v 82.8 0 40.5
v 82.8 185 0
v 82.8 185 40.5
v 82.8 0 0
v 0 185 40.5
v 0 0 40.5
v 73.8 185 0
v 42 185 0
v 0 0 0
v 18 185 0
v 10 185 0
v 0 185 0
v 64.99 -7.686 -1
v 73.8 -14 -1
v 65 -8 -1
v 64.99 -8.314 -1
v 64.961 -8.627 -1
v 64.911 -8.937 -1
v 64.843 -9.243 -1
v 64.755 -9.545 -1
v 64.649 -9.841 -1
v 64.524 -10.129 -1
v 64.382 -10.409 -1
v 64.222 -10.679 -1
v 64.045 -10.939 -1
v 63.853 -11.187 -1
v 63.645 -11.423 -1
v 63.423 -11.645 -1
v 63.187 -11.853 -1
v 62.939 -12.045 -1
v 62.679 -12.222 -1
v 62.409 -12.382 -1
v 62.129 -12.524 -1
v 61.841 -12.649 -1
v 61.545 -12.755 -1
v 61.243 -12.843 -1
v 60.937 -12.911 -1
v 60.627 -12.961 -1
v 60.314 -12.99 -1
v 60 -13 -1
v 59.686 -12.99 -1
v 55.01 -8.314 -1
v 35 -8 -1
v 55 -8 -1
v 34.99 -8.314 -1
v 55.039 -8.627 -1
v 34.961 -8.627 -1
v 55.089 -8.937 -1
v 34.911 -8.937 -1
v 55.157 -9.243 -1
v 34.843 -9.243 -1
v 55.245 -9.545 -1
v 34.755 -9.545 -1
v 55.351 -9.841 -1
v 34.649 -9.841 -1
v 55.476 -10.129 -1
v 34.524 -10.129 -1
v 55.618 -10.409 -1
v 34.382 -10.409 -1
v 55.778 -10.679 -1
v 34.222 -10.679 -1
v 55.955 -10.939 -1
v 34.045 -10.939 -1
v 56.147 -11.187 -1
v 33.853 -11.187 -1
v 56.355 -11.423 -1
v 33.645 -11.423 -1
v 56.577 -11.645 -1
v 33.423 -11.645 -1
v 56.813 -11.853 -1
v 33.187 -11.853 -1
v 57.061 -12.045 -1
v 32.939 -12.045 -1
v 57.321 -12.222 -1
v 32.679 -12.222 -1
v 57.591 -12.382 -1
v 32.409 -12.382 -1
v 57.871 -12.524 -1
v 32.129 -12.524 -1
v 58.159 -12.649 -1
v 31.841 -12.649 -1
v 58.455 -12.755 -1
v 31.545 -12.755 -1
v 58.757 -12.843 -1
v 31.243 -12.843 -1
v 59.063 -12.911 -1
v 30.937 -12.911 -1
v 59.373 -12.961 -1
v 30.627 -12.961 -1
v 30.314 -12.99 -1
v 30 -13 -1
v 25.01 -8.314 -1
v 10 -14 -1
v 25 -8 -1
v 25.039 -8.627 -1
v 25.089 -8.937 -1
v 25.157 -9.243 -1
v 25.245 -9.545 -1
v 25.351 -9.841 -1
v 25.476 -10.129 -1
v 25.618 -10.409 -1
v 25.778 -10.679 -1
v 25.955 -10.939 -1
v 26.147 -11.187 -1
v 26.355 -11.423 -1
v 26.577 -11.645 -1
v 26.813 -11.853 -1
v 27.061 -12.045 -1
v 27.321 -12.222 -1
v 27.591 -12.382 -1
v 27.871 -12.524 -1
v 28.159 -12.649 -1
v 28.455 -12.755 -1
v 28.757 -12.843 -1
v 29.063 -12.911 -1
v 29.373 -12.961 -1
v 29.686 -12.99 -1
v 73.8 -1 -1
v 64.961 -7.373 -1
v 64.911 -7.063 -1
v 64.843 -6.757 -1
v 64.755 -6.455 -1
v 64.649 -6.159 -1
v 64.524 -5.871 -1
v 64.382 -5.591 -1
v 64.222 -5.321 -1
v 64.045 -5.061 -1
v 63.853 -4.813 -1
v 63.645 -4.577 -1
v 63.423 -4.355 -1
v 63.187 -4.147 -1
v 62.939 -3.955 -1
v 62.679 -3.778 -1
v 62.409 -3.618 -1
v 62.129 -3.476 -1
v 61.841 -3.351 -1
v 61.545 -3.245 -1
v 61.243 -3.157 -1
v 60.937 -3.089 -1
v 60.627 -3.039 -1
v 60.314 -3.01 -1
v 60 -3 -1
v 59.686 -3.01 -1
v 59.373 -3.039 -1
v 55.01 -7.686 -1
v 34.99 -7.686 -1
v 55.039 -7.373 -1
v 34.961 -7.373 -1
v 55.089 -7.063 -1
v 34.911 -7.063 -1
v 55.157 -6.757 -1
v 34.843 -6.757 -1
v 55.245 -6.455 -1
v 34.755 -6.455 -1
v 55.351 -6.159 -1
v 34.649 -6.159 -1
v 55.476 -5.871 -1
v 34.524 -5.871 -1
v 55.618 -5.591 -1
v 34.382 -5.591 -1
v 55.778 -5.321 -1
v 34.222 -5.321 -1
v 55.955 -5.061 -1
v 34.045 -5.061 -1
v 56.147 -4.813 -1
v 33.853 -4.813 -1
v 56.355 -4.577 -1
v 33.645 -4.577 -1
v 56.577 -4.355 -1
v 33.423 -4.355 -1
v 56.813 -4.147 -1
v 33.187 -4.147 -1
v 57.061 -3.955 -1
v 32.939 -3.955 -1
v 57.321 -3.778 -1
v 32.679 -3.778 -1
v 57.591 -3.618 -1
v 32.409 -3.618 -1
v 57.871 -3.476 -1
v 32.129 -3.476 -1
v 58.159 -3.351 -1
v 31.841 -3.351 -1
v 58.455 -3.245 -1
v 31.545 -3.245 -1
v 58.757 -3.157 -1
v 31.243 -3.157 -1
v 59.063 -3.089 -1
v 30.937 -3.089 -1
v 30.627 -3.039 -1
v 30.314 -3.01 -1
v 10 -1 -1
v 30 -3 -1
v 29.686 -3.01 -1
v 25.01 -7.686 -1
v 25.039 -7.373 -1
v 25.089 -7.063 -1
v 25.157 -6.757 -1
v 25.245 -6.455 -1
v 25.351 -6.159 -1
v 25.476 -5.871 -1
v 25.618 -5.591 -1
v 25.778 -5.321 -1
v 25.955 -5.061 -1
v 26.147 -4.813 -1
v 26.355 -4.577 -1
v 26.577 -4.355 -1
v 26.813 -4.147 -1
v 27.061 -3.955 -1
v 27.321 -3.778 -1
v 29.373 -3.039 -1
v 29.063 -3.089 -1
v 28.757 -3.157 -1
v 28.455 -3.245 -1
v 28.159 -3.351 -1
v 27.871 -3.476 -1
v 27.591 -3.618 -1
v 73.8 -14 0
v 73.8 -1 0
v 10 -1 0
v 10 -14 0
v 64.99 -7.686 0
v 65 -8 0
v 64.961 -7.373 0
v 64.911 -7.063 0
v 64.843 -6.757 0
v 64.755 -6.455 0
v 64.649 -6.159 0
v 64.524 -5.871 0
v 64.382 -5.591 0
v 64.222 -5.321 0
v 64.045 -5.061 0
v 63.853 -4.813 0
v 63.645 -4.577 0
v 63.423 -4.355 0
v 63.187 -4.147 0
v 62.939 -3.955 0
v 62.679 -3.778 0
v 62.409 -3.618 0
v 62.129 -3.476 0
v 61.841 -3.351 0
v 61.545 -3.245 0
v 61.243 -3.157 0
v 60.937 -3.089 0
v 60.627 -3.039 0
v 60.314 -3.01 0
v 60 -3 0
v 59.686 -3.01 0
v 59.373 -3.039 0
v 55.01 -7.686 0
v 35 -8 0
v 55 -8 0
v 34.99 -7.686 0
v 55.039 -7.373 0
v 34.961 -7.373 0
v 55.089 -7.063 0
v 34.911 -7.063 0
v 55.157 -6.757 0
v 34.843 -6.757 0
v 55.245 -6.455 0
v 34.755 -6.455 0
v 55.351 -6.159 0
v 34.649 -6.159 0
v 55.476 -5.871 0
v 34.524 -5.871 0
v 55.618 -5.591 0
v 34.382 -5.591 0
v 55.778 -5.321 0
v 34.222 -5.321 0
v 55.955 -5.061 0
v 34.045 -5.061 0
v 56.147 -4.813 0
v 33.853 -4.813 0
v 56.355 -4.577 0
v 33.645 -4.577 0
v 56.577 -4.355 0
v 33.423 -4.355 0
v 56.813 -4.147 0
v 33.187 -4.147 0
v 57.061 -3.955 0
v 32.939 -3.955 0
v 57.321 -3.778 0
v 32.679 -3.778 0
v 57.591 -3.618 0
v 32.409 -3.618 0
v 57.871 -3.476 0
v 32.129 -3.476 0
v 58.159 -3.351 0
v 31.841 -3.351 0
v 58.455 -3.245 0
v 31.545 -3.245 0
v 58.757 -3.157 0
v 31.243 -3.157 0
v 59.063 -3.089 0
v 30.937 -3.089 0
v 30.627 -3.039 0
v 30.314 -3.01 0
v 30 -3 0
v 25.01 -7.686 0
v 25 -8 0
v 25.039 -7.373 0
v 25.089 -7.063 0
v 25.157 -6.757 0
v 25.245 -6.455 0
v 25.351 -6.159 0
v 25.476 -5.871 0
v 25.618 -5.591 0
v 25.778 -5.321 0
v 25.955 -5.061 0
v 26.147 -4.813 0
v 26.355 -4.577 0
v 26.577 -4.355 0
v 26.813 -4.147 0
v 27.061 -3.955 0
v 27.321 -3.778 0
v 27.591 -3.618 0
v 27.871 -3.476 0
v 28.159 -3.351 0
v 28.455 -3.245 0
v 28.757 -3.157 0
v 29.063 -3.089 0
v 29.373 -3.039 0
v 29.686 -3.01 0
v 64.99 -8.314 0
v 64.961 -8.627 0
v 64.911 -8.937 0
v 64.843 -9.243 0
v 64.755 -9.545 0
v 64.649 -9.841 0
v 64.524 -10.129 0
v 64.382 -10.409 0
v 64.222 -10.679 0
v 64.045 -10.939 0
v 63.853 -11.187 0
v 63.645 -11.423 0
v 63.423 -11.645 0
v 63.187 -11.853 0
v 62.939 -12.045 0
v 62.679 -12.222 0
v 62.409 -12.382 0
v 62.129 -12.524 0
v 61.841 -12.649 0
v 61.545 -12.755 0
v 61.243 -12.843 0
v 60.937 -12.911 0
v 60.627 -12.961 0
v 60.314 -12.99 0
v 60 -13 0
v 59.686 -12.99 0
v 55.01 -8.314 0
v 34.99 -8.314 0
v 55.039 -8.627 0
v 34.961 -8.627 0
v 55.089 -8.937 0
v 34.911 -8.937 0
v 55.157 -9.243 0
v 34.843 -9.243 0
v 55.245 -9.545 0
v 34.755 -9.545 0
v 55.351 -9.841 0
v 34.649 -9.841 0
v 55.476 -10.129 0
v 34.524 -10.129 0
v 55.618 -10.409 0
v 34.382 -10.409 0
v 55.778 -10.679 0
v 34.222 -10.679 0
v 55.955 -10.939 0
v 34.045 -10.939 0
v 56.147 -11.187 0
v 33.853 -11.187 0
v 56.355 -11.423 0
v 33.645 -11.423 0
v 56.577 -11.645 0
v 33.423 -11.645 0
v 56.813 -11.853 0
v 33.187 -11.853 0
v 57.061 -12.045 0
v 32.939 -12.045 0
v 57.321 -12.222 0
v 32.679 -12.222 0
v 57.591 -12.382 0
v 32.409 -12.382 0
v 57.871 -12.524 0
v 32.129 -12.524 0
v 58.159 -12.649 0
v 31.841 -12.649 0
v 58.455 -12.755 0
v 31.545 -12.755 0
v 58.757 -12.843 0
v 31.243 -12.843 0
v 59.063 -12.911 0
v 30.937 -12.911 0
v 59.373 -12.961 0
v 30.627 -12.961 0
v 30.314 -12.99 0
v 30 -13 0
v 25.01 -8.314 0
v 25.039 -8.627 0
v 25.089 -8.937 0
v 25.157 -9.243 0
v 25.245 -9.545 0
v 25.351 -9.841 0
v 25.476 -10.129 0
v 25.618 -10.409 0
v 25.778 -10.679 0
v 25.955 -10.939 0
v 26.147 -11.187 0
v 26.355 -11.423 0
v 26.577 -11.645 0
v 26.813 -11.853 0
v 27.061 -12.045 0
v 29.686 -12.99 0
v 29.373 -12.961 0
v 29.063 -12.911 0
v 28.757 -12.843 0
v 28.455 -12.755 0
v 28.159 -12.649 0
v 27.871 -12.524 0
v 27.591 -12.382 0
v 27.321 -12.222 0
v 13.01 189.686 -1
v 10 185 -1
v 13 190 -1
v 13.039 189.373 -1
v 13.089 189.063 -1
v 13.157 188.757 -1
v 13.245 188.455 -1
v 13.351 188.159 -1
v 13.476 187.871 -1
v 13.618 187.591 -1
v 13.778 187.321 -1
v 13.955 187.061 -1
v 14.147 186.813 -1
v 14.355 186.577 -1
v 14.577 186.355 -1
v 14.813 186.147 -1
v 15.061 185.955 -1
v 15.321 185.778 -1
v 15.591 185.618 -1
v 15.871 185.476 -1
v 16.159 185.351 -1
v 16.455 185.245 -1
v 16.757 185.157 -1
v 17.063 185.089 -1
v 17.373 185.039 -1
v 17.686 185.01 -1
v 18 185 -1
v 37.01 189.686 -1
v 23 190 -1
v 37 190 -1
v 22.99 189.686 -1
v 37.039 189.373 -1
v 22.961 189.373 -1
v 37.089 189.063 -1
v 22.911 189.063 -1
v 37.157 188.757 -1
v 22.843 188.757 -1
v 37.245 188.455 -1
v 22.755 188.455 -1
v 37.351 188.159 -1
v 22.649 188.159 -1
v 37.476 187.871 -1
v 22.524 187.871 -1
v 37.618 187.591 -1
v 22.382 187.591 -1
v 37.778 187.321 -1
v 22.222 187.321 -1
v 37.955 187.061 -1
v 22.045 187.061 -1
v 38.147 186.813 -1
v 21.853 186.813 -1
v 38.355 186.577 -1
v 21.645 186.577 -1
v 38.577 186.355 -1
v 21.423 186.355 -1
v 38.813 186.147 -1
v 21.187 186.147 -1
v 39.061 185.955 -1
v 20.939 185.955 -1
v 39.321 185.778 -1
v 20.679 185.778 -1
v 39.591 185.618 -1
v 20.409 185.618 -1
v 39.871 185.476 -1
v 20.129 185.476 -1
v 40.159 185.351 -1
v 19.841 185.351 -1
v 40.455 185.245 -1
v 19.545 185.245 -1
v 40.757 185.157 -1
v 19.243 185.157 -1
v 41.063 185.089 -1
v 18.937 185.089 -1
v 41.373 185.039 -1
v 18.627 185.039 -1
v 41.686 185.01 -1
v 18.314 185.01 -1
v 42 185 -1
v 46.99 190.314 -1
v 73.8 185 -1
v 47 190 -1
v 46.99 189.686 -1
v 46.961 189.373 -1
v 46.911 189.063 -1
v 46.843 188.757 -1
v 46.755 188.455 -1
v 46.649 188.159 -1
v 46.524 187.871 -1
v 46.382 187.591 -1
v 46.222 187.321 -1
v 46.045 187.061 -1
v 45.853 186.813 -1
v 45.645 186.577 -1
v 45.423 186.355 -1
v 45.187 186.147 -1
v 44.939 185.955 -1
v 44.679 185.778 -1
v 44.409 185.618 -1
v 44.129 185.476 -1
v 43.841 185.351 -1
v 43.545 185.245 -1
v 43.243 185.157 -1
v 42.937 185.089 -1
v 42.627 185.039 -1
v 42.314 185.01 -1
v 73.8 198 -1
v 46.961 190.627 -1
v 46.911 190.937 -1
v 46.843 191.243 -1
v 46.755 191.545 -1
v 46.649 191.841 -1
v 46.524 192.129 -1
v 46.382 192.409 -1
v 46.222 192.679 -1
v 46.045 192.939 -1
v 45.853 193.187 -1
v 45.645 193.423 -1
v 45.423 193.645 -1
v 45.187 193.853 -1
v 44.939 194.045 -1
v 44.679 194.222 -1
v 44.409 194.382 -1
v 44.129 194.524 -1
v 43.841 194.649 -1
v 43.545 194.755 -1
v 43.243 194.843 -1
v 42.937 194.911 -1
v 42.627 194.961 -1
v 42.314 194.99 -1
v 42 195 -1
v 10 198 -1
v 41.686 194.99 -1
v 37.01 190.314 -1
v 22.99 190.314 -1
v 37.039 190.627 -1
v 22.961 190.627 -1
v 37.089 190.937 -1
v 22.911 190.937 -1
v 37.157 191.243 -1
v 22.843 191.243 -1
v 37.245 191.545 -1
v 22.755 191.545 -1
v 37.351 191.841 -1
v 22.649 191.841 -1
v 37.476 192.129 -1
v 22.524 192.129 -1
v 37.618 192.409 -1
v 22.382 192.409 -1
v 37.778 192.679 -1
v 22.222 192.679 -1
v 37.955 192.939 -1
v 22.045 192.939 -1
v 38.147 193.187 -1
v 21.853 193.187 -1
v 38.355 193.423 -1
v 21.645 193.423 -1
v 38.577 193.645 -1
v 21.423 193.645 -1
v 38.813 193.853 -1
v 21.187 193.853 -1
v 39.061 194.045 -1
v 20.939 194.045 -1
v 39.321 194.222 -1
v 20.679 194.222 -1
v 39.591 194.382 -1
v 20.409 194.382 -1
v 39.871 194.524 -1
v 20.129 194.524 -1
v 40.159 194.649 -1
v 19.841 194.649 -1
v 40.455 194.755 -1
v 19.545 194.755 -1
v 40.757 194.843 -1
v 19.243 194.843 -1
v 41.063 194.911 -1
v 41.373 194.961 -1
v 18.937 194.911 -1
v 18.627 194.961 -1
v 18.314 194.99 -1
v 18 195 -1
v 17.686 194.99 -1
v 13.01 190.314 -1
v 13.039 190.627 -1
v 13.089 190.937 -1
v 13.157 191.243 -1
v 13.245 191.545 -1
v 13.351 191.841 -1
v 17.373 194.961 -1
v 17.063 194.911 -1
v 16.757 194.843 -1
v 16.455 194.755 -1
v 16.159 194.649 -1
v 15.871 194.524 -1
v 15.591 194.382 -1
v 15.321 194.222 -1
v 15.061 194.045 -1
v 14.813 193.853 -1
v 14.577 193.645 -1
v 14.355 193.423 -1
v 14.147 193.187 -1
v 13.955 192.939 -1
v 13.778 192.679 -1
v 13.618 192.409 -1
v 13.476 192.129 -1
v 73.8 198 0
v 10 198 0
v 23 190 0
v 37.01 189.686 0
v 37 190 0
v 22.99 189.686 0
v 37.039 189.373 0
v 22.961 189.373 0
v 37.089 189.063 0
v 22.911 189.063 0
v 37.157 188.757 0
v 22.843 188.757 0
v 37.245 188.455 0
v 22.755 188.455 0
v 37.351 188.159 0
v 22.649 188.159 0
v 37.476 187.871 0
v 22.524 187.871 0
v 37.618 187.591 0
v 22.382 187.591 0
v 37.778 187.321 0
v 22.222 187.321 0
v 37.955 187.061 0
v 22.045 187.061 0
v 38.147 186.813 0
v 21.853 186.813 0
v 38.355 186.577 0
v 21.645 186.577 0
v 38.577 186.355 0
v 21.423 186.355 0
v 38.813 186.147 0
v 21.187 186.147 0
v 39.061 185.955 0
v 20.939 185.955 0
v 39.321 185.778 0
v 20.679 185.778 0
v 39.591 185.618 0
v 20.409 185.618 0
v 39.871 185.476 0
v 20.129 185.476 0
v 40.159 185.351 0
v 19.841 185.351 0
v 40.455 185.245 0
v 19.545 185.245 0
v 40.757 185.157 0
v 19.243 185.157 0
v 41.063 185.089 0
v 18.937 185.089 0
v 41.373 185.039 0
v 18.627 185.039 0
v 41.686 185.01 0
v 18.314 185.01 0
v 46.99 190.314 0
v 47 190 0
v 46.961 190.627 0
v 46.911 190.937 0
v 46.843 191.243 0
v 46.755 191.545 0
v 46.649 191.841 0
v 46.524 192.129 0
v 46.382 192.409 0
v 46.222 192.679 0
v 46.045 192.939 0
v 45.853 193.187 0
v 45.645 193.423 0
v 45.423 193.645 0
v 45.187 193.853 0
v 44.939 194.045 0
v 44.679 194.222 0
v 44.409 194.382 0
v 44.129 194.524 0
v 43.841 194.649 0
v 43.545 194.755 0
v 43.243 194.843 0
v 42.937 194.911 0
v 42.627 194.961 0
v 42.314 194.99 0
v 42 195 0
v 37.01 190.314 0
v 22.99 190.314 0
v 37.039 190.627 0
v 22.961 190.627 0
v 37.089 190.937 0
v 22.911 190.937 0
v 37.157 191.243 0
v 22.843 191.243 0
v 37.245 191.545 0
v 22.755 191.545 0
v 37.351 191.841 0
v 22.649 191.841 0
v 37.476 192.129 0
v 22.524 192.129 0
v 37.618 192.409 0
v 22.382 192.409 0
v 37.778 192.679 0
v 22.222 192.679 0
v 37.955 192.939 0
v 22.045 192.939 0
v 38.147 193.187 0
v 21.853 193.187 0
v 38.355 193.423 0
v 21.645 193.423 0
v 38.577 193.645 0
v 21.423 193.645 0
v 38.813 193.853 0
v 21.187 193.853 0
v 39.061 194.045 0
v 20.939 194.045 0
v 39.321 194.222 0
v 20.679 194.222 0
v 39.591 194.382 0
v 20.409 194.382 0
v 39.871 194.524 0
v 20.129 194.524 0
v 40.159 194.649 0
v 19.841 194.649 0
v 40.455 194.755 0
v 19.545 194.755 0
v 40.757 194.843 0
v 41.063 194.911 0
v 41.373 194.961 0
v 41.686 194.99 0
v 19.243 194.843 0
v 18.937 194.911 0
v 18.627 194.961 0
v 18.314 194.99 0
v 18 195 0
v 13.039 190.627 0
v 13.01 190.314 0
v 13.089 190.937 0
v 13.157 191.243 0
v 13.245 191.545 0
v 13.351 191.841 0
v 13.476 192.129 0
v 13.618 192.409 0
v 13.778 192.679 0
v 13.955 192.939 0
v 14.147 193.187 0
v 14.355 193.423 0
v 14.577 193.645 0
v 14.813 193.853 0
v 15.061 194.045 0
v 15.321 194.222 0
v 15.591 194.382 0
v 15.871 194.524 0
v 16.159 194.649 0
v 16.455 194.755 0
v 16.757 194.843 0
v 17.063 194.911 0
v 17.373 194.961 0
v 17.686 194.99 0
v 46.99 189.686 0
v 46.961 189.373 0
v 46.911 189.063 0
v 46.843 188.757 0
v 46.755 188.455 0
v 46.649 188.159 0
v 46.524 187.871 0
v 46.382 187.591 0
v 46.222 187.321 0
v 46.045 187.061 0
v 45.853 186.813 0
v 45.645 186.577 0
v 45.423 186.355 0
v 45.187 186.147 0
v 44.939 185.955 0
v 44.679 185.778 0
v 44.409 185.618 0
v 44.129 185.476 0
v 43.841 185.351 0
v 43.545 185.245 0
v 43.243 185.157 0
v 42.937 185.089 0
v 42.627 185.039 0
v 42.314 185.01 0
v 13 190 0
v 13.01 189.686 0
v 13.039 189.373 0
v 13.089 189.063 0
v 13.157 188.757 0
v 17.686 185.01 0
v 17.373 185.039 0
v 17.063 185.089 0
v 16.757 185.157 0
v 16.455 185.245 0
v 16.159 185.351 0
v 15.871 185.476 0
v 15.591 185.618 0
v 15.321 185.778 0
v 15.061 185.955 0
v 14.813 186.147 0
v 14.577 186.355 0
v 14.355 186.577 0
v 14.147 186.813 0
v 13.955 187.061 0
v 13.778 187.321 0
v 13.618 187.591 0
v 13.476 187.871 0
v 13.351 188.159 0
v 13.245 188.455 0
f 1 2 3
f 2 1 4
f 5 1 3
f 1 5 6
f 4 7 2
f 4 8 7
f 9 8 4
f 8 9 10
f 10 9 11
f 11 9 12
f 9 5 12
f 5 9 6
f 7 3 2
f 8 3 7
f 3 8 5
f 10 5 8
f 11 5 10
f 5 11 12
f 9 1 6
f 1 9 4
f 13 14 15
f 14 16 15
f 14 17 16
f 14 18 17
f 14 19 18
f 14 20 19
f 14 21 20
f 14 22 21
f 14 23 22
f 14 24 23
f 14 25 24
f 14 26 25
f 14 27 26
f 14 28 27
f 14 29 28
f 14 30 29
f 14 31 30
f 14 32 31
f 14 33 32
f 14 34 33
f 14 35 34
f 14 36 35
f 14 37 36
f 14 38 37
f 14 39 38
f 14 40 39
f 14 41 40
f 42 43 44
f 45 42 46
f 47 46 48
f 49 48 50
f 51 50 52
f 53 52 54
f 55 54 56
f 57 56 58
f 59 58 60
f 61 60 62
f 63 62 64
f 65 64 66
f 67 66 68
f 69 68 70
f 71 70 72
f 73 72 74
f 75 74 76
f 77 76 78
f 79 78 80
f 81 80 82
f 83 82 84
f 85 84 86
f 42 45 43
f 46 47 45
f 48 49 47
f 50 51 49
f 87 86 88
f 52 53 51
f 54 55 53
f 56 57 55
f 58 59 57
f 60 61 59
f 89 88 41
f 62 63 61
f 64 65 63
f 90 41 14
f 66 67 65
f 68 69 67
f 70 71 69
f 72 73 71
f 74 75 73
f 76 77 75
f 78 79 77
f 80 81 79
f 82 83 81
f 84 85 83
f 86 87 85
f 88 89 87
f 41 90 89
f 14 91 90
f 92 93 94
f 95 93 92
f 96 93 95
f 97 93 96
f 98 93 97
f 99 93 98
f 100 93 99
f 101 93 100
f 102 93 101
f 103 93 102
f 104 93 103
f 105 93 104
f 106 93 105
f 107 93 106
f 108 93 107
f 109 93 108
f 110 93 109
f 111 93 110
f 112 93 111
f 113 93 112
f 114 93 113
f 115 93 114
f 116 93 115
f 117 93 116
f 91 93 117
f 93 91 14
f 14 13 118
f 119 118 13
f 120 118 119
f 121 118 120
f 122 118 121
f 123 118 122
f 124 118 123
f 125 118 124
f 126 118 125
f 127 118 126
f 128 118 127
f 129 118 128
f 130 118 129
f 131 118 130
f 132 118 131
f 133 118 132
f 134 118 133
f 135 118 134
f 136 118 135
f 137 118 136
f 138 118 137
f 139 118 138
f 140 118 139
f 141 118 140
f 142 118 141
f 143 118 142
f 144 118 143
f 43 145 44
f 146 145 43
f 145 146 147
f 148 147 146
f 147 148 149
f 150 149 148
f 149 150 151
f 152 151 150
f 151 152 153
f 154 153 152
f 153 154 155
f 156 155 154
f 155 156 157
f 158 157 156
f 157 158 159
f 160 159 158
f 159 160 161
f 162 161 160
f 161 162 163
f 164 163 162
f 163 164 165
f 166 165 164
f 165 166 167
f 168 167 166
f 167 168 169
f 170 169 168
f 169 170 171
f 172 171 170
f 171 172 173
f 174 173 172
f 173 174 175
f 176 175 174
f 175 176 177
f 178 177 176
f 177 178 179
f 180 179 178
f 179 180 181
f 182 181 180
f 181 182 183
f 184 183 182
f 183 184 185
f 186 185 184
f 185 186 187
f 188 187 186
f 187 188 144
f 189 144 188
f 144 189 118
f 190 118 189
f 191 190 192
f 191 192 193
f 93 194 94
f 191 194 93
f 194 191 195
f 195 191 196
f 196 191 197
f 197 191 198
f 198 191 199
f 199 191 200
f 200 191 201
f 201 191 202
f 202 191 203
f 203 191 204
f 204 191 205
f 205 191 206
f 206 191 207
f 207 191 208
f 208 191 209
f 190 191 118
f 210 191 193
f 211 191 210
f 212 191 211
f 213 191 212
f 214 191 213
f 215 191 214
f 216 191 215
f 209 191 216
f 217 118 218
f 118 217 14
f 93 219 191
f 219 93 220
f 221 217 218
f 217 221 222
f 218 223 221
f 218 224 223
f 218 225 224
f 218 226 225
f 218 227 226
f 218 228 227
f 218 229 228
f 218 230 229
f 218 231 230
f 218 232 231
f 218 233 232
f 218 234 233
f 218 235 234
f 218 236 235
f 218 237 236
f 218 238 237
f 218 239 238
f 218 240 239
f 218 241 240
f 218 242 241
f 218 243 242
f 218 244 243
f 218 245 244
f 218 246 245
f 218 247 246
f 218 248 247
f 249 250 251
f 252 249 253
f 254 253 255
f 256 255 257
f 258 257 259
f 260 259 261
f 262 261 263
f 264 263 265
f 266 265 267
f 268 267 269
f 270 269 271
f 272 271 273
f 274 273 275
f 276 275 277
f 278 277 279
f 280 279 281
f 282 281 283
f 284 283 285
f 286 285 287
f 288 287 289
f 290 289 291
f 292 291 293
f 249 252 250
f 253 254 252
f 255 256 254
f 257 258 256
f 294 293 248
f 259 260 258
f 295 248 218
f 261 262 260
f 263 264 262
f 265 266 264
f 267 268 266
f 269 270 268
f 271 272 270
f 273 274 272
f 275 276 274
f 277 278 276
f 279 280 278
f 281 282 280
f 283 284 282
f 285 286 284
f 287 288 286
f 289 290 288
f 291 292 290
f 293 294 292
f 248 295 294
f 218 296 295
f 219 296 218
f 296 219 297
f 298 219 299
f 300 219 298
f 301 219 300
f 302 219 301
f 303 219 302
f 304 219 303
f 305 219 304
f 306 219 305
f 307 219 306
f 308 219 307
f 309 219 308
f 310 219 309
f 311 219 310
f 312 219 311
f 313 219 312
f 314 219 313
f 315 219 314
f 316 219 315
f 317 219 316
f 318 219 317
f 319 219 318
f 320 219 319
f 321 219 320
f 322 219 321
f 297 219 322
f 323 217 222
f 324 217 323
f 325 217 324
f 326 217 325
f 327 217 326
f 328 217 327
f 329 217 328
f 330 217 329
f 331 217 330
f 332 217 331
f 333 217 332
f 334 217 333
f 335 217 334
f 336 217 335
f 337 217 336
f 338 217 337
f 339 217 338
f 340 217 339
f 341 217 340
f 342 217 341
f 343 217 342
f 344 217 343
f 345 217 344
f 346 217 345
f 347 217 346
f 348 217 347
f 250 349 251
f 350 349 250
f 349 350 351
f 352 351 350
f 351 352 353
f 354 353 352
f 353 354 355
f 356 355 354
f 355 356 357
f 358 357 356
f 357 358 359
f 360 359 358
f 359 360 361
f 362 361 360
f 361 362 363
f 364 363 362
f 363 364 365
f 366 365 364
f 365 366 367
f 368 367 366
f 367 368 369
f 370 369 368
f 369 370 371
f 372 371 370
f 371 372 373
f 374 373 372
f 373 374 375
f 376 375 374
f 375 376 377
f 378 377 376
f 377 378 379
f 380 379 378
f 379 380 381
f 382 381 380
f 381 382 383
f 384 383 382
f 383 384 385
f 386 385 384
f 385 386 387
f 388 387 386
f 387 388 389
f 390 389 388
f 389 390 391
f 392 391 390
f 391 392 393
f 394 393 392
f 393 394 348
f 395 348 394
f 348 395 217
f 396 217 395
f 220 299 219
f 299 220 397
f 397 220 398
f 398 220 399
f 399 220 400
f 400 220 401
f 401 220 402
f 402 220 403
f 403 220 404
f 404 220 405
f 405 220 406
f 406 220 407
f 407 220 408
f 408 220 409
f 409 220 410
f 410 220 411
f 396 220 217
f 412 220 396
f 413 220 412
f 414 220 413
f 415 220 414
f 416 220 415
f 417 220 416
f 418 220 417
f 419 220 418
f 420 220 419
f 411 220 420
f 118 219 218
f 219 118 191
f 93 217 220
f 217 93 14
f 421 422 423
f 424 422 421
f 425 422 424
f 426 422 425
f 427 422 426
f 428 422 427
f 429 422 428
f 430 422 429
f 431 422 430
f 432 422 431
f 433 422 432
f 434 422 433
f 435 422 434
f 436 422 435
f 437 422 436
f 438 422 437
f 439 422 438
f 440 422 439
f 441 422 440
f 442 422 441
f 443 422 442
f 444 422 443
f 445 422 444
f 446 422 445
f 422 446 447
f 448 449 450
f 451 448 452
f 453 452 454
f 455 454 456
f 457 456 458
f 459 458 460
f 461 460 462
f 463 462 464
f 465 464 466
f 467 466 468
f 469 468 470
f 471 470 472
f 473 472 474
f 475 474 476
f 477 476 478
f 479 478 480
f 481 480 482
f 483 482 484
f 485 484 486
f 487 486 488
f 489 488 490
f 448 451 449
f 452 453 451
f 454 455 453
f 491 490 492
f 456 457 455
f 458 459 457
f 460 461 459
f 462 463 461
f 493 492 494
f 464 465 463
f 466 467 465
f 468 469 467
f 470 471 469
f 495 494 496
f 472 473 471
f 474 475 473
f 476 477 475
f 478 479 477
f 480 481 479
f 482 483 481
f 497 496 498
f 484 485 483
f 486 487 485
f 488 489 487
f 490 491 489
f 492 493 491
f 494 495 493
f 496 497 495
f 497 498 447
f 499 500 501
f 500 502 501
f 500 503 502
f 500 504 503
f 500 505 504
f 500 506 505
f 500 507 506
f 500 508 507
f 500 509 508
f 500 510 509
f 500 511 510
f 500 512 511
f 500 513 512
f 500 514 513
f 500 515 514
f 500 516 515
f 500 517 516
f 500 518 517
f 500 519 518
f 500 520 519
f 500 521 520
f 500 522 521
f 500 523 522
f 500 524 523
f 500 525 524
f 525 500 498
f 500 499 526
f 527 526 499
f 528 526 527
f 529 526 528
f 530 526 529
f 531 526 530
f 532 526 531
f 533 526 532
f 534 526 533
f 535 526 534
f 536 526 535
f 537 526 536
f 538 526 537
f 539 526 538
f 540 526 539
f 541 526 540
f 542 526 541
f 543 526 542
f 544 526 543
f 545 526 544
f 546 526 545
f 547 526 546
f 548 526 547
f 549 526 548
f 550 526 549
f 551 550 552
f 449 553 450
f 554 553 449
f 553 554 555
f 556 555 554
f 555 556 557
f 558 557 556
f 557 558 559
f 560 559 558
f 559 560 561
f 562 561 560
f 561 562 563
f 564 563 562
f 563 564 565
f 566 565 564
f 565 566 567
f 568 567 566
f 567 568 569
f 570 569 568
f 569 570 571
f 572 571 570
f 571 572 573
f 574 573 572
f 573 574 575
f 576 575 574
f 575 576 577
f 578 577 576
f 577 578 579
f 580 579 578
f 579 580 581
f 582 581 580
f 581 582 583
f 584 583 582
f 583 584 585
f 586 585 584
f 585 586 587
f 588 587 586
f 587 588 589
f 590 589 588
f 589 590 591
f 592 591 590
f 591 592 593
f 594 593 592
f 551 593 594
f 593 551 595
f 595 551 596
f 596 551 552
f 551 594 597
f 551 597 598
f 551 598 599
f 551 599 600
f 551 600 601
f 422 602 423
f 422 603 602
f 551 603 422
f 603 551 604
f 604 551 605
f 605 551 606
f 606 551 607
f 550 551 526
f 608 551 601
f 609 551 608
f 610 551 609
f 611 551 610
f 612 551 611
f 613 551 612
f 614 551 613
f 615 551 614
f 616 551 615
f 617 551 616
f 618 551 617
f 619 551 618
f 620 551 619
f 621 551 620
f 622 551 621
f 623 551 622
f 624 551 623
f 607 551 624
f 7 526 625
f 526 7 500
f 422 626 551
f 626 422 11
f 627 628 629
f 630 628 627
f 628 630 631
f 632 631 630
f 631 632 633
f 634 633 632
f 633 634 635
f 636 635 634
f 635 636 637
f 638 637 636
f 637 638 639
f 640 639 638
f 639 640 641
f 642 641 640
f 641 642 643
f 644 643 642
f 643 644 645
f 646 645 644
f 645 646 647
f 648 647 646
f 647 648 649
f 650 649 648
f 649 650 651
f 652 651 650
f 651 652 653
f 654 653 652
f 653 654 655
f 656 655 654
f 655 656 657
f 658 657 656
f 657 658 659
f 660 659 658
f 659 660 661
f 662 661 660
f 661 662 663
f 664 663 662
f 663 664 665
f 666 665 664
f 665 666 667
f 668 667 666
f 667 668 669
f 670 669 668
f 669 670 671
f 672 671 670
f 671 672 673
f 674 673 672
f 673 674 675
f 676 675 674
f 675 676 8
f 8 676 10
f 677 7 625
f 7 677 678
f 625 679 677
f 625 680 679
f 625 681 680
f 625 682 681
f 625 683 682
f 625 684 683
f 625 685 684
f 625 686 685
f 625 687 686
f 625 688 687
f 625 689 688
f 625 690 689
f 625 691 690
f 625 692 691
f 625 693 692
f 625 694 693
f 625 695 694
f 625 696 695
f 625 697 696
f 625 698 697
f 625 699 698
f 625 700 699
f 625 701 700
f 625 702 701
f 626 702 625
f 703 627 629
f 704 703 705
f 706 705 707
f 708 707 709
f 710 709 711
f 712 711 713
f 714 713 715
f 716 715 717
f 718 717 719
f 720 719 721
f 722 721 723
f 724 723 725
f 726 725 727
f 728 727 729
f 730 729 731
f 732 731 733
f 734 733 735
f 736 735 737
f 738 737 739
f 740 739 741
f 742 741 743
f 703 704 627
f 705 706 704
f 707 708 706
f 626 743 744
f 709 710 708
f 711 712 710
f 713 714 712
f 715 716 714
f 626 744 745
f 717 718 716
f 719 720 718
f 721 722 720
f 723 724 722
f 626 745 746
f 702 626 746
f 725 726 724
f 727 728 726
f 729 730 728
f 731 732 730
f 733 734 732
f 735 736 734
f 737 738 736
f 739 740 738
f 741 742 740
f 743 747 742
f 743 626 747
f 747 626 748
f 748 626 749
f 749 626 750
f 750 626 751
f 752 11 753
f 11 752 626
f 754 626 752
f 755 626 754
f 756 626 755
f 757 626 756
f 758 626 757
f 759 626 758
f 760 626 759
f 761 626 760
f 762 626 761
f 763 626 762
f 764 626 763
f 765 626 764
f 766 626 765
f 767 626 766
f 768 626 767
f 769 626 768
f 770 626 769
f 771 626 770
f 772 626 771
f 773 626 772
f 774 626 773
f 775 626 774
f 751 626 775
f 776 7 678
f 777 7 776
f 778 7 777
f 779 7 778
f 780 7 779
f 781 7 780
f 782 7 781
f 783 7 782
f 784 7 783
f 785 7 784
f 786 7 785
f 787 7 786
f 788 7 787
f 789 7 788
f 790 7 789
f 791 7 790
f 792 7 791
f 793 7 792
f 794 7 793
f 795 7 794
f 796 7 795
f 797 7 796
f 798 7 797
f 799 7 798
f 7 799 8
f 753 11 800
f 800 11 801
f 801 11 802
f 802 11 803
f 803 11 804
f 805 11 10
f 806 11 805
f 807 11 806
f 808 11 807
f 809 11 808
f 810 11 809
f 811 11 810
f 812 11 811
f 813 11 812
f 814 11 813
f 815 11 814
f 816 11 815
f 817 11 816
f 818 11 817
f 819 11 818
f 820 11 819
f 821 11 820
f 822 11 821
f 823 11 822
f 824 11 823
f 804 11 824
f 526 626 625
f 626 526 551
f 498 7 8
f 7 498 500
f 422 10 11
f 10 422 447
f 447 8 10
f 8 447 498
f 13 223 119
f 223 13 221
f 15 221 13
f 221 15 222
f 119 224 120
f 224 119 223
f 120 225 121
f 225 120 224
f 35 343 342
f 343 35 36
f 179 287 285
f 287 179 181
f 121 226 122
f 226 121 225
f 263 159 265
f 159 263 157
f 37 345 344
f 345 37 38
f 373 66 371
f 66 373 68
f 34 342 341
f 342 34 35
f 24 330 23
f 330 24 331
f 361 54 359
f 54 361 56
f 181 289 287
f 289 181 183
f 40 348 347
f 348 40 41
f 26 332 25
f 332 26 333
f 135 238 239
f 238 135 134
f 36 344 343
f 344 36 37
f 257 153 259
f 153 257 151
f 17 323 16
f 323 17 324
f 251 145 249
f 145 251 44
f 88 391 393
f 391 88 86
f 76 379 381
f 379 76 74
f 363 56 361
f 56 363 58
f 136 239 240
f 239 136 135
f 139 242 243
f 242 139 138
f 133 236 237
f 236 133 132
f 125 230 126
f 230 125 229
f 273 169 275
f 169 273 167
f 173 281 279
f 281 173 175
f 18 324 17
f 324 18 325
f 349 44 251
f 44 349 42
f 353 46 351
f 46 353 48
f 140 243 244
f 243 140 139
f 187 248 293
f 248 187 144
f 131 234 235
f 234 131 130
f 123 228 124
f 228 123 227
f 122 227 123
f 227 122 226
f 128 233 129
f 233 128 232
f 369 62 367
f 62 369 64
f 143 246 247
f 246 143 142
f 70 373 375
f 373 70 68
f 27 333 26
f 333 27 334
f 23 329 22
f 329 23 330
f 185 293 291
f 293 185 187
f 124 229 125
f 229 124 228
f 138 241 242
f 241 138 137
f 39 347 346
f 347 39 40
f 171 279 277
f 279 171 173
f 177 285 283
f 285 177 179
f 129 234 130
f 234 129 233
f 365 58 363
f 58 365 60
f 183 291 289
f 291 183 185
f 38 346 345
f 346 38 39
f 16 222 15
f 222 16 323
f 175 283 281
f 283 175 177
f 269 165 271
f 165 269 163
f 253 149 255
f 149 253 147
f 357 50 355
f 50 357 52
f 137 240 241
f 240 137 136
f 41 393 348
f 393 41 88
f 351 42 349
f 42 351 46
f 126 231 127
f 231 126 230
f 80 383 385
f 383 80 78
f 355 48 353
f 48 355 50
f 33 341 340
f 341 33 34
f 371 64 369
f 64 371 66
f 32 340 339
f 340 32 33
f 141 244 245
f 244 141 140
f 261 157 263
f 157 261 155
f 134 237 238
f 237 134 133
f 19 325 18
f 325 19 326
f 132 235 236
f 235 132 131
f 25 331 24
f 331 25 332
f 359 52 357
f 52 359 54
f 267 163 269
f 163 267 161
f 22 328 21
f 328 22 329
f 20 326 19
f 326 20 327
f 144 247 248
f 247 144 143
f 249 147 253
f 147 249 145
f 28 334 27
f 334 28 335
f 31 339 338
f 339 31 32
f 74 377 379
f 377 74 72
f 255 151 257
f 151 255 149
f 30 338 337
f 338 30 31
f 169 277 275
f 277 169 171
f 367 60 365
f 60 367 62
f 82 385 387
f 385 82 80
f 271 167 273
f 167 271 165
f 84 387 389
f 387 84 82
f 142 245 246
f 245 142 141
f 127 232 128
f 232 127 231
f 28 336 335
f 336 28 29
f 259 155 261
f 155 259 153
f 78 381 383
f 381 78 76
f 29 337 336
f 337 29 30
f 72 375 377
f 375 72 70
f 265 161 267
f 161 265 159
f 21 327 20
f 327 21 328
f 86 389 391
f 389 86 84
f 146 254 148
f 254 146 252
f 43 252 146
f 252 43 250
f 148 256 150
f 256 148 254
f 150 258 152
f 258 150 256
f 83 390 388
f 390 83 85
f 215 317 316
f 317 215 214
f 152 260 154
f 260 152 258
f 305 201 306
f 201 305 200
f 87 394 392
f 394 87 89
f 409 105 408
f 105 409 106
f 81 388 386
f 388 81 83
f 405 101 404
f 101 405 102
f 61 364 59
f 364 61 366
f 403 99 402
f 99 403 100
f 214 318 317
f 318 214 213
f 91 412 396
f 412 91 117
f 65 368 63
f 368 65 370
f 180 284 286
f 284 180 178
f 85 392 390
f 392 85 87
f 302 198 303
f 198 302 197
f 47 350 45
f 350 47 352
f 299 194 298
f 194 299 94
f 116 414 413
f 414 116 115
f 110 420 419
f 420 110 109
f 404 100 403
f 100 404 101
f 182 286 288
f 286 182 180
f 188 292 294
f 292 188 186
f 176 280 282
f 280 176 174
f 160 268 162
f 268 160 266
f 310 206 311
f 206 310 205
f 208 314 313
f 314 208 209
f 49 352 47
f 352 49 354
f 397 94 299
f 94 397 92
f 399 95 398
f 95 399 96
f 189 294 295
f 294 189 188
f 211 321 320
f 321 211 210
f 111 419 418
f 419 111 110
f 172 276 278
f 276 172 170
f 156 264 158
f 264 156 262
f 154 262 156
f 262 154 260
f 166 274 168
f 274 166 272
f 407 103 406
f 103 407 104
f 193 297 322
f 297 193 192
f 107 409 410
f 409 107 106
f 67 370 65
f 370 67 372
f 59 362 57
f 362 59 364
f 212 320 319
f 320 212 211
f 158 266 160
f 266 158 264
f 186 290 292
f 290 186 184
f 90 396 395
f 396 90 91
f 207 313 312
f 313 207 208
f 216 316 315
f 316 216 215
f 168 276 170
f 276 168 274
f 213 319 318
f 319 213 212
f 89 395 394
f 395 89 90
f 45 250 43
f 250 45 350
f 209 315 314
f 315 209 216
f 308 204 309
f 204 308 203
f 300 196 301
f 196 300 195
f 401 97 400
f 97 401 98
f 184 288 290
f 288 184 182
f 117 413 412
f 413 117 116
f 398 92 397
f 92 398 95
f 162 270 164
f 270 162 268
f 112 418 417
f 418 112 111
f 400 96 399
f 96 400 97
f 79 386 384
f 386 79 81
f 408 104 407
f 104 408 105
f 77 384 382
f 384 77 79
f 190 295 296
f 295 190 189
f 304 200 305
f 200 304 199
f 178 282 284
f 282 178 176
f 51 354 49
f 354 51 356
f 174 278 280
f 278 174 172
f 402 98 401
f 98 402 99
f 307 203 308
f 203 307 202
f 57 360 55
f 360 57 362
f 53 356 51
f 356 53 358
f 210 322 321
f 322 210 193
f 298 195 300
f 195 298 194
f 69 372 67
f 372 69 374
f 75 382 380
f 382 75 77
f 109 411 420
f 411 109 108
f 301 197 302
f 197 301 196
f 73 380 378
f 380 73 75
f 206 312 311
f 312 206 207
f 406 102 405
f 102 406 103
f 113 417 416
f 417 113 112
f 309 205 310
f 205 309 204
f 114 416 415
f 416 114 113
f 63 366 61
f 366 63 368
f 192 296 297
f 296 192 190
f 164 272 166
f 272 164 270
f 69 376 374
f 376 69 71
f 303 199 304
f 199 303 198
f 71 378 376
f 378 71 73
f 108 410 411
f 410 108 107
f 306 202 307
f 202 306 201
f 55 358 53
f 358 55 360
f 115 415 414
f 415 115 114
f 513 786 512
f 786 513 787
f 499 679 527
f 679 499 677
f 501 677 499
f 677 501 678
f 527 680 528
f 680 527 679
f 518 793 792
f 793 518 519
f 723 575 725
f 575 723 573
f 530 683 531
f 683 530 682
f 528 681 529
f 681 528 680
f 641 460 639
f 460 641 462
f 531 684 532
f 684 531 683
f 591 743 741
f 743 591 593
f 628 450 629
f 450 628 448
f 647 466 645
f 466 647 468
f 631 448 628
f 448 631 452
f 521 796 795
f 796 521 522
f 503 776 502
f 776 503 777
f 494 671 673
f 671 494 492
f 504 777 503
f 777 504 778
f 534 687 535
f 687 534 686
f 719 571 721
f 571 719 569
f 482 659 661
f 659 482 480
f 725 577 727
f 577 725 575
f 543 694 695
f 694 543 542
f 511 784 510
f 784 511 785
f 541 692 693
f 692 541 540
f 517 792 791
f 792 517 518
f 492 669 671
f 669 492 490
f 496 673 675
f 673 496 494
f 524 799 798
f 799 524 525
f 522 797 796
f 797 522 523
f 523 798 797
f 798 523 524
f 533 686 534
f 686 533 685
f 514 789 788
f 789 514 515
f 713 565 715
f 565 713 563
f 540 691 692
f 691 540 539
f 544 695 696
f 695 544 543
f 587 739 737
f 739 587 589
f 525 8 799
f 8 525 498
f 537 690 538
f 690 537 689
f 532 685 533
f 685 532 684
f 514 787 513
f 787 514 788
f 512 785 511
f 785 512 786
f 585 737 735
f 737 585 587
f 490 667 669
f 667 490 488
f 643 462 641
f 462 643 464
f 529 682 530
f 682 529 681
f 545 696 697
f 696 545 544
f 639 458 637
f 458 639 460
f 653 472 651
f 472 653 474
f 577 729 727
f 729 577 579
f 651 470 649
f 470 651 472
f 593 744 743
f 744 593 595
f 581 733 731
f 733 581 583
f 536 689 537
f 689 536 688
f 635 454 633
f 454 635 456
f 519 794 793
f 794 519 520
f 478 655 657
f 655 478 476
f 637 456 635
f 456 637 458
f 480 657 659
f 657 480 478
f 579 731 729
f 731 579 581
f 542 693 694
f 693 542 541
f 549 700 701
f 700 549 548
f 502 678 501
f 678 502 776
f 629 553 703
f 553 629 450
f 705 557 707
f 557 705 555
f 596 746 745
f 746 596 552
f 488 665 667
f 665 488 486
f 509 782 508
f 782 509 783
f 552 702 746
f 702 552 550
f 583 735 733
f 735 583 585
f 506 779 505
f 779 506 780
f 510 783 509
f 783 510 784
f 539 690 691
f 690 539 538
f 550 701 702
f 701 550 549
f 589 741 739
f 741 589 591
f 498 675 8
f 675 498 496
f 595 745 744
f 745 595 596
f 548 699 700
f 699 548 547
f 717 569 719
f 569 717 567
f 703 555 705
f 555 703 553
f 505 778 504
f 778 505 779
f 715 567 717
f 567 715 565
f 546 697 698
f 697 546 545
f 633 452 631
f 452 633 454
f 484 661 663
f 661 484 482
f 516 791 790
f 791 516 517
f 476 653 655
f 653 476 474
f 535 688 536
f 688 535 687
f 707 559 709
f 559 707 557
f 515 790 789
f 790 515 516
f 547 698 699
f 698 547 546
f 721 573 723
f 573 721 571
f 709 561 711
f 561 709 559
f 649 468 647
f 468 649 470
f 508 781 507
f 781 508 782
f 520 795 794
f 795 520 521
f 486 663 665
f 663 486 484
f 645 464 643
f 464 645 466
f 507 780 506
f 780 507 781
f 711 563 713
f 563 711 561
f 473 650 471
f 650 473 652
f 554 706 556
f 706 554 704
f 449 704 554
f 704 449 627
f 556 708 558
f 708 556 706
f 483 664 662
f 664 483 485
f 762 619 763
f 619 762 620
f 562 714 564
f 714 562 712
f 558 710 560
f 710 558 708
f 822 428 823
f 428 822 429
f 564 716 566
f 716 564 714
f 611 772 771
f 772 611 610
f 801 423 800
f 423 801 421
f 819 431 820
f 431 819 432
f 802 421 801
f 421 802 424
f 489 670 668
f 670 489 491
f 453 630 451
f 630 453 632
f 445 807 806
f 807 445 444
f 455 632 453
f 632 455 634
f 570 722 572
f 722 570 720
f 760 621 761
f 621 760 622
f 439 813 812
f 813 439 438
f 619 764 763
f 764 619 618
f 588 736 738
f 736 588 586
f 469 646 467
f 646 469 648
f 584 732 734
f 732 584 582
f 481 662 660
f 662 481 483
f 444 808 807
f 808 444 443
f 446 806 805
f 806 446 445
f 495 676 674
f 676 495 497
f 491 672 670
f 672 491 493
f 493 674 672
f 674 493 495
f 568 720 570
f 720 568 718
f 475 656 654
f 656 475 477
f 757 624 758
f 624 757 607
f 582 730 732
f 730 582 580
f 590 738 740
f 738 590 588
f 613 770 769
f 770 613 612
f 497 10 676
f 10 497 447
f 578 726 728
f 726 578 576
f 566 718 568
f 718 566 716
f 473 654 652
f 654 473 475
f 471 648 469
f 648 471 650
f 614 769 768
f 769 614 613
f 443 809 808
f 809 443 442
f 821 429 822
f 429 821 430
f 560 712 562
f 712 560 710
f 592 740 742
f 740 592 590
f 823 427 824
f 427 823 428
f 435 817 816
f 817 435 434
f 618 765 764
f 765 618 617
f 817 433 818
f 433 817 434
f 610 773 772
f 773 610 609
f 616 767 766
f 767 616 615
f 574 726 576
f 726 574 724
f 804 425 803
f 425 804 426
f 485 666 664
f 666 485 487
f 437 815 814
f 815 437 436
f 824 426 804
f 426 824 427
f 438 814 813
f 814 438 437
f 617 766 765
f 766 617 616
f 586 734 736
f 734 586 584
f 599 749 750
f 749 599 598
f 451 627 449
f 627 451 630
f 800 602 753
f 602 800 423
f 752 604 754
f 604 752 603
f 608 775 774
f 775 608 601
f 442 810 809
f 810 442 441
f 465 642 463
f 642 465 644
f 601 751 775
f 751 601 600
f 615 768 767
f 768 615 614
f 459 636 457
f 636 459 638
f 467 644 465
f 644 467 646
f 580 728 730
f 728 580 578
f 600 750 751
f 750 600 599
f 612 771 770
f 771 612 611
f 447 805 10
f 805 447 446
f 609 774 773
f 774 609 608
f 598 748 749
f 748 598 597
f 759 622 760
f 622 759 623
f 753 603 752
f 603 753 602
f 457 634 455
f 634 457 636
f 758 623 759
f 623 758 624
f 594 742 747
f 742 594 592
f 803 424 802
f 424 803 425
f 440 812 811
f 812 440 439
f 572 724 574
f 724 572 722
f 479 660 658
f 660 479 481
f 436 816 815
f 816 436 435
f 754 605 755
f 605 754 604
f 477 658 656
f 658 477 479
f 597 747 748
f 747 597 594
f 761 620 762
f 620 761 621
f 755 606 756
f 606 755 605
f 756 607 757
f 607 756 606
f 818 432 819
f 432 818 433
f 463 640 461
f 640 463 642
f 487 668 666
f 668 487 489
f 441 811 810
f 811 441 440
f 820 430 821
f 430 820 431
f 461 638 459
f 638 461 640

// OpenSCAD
////////////////////////////////////////////////
/////////////Open SCAD ////////////////////////
/*//////////////////////////////////////////////

date started  ///1.6.2020
date finished
modler Colin
/*


cylinder ([]) ;   sphere();  cube([]);
square ([]);  circle();
*/


///////////////////////////////////////////////
////////////////////////////////////////////////
////////////////////parameters//////////////////
////////////////////////////////////////////////
//globals

width_controler=82.8;
length_controler=40.5;
height_controler=185;

width_controler_attachment=1;
length_controler_attachment=63.8;
height_controler_attachment=13;


////////////////////////////////////////////////
/////////////////////renders////////////////////
///////////////////////////////////////////////
ComplexObject();

////////////////////////////////////////////////
////////////////////modules////////////////////
///////////////////////////////////////////////
//cylinder () ;   sphere();  cube([]);
//square ([]);  circle();


$fn = 100;
//import();

module ComplexObject()
{
difference()
    {



        union()//Add things to object

       {
           cube([width_controler,height_controler,length_controler]);
           translate([10,-14,0]){
               rotate([0,90,0]){
           #cube([width_controler_attachment,height_controler_attachment,length_controler_attachment]);

           }
       }
       translate([10,185,0]){
               rotate([0,90,0]){
           cube([width_controler_attachment,height_controler_attachment,length_controler_attachment]);

           }
       }
}


            union()//Subtract things from object
    {
                   translate([60,-8,-5]){



         #cylinder (10,5,5);


               }
                translate([30,-8,-5]){



         #cylinder (10,5,5);
                }

 translate([42,190,-5]){



         #cylinder (10,5,5);
                }
                translate([18,190,-5]){



                        #cylinder (10,5,5);
                               }
                               translate([18,190,-5]){



                                       #cylinder (10,5,5);
                                              }

}


  }




}
